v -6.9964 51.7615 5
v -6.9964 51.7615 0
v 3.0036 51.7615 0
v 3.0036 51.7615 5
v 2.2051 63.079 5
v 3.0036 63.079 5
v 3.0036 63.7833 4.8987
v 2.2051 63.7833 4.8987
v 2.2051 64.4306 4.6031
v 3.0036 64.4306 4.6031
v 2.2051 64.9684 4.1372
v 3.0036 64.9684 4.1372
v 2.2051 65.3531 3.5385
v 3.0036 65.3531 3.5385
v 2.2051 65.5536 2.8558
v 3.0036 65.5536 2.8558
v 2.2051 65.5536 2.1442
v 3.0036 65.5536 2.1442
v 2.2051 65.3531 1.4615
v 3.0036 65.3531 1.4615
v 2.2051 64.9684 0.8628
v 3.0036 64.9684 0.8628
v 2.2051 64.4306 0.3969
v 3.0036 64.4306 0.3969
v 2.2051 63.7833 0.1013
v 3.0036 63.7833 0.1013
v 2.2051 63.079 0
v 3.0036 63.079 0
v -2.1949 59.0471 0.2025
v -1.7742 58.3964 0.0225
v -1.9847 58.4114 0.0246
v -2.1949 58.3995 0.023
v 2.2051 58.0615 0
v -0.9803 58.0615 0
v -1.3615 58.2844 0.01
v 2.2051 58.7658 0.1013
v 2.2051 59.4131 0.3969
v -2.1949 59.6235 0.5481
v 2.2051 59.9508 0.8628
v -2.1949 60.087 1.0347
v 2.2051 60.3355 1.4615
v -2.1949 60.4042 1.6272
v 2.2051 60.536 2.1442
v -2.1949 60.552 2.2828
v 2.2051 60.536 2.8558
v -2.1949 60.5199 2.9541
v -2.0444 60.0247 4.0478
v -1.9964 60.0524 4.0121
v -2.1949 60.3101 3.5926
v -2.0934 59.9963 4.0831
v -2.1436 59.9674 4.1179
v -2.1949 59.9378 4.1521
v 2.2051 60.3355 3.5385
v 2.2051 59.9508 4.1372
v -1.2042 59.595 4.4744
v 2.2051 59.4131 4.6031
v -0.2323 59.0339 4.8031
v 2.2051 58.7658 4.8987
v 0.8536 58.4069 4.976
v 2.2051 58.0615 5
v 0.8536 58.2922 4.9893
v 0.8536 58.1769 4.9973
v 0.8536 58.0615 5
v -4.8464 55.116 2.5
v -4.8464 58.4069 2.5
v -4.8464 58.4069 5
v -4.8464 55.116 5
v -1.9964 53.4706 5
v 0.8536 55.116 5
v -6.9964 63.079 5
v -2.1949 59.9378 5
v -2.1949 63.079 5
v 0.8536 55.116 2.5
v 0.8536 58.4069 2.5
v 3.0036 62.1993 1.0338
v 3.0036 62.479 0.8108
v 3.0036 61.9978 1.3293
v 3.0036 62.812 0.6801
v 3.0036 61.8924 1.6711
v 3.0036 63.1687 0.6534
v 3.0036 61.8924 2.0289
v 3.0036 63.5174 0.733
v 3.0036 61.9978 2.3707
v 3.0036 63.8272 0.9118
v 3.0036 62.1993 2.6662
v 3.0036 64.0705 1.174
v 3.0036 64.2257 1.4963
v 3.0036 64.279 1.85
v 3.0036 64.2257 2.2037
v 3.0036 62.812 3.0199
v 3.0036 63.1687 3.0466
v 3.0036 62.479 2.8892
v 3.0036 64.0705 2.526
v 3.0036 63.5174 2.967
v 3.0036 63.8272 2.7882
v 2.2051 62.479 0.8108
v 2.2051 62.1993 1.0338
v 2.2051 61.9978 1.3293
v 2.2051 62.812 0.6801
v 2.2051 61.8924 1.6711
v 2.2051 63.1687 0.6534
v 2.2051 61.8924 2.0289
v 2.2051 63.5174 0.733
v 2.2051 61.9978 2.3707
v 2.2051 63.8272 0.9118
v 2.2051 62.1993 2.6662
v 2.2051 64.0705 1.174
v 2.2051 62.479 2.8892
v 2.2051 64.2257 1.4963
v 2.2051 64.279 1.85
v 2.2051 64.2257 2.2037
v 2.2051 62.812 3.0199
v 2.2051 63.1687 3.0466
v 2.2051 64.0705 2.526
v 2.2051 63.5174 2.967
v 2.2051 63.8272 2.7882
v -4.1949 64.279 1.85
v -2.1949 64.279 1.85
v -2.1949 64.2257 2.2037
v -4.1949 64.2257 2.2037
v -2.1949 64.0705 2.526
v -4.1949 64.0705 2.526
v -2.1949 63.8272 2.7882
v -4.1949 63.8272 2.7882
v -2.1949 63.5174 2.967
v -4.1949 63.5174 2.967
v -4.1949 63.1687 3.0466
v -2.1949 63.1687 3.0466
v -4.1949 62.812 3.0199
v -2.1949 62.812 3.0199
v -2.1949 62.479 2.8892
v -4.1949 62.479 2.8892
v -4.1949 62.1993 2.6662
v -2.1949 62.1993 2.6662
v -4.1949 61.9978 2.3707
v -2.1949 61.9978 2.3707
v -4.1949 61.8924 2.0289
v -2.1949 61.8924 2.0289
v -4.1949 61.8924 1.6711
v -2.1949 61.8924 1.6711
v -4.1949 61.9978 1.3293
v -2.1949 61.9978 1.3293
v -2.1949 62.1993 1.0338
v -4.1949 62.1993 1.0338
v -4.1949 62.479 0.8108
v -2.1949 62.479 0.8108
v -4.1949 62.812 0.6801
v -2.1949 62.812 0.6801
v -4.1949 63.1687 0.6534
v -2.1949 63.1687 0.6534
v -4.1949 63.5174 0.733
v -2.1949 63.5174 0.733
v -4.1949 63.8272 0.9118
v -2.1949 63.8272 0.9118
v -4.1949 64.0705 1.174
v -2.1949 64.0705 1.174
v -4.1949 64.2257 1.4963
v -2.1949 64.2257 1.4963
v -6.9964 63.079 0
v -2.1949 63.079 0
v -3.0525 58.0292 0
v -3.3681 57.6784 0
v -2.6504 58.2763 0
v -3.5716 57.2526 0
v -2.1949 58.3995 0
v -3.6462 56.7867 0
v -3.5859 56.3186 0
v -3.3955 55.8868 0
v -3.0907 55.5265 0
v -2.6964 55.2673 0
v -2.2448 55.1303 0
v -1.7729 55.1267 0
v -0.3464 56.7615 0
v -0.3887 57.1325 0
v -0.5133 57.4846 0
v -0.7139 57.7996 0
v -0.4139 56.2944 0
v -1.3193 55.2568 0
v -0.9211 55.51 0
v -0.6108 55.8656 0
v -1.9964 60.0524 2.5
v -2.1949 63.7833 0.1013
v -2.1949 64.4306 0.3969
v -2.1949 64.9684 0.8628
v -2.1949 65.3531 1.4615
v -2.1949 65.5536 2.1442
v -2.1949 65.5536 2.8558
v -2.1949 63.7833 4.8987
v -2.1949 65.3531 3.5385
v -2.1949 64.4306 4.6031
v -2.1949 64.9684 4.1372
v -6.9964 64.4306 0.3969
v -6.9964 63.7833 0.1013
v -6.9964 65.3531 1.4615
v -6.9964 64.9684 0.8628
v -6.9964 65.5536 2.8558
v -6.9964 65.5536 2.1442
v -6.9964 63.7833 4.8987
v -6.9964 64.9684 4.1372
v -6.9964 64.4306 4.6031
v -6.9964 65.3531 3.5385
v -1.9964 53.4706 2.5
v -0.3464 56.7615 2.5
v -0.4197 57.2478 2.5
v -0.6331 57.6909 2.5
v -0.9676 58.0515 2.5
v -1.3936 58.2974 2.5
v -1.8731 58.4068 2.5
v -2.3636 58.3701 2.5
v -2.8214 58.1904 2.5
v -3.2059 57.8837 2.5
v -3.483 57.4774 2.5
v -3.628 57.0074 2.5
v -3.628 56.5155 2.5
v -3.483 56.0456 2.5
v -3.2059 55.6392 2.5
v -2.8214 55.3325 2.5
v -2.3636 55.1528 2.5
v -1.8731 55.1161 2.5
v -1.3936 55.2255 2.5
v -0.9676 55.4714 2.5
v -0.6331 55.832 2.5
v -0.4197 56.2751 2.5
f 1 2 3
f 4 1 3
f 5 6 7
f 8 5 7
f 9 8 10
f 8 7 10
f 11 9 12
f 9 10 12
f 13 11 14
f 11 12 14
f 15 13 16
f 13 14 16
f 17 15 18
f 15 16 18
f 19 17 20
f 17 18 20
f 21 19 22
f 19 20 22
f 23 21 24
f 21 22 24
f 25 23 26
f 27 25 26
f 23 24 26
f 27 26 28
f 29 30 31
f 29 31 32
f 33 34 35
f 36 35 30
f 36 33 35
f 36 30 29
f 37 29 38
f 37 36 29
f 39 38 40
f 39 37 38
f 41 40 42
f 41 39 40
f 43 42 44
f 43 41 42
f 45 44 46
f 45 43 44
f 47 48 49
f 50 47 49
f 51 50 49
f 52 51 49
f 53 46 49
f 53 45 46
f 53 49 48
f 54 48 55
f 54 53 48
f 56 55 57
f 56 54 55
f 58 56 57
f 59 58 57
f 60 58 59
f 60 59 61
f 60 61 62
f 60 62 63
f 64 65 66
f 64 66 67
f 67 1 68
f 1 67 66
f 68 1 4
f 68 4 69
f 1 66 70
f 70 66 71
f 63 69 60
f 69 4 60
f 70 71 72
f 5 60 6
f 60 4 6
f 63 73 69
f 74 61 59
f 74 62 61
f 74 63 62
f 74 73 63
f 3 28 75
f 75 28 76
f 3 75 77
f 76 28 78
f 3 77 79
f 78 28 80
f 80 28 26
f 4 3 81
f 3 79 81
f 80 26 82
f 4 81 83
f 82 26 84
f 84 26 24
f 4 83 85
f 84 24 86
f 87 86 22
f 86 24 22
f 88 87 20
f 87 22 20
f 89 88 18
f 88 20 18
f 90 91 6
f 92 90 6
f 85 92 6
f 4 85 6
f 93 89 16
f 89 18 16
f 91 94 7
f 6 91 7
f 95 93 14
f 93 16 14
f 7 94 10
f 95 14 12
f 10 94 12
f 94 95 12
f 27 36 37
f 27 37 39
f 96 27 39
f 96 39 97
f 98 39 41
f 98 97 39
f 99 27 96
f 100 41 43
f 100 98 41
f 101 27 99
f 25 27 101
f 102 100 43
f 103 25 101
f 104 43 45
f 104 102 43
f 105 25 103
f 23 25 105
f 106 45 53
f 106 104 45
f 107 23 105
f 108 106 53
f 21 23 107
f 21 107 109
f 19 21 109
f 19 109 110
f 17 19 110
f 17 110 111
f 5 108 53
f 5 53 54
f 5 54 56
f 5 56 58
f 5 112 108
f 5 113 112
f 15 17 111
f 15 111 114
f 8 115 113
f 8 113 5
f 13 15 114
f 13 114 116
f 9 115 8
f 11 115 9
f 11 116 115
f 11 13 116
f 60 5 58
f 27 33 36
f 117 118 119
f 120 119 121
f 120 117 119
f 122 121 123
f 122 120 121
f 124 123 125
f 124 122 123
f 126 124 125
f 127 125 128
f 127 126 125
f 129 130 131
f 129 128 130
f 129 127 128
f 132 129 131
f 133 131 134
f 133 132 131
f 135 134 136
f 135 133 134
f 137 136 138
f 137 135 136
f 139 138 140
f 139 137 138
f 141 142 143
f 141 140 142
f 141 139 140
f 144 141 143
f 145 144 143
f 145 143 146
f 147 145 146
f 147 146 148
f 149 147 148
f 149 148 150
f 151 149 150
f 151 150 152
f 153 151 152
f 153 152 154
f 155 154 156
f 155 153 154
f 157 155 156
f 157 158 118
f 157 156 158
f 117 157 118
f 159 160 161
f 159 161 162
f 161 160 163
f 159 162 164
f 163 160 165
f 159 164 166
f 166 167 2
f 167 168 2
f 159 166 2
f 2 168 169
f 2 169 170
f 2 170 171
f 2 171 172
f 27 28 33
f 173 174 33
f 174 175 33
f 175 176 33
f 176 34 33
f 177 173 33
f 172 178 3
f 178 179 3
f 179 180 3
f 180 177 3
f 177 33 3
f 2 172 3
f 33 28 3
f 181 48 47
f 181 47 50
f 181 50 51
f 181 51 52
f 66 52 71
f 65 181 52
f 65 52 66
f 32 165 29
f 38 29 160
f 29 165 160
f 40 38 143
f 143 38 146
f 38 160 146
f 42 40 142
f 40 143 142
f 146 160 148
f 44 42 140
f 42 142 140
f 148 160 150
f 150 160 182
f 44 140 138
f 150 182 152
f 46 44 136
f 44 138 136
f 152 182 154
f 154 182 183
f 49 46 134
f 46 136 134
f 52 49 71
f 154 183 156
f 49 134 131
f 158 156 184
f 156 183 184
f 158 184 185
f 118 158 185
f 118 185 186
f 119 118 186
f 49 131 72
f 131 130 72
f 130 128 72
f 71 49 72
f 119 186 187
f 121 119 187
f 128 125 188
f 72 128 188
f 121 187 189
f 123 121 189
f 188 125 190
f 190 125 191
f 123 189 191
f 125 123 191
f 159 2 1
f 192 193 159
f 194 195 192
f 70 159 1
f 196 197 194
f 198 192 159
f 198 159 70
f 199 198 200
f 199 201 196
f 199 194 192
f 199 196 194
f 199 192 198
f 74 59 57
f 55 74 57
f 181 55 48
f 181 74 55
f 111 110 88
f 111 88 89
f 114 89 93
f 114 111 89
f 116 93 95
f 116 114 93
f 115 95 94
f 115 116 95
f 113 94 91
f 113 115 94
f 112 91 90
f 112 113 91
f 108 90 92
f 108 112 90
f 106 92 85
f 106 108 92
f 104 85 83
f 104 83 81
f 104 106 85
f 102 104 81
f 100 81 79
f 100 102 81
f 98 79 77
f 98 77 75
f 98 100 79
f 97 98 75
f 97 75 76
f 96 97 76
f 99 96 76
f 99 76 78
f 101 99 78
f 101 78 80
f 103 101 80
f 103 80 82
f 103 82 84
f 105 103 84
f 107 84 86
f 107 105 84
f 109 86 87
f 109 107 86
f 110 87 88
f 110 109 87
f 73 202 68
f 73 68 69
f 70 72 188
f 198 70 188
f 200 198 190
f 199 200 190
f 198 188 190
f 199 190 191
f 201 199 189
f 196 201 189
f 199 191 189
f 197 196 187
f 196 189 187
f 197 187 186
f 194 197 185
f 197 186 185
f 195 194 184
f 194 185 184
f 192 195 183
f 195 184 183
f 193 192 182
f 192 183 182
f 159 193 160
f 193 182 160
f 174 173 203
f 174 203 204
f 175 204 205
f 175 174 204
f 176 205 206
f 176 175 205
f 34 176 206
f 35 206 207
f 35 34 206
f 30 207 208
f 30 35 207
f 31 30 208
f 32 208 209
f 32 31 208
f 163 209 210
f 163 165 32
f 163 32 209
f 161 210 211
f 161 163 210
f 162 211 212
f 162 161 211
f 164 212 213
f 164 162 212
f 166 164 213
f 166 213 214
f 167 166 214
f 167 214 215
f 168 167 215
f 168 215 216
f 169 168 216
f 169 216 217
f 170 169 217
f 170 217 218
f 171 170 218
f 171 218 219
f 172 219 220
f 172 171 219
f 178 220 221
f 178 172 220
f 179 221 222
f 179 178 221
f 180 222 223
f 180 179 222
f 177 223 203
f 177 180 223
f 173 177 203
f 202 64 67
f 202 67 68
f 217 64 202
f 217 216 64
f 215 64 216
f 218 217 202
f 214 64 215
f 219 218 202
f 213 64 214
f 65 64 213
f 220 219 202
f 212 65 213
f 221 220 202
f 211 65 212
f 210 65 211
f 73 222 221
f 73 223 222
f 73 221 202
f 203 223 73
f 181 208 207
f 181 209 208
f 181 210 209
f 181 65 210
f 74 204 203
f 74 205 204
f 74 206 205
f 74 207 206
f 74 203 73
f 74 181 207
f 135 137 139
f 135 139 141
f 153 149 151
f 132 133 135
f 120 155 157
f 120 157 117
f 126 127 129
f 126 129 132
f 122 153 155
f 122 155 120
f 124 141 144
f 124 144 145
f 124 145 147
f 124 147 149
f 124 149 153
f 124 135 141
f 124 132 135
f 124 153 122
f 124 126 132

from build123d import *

# Parameters (mm, degrees)
SKETCH_1_R          = 1.65
EXTRUDE_1_DEPTH     = 2.5
SKETCH_1_3_W        = 10
SKETCH_1_3_H        = 10
EXTRUDE_2_DEPTH     = 5
EXTRUDE_3_DEPTH     = 10
OTHER_START         = -2.194885141
OTHER_1_DEPTH       = 4.4
OTHER_START_2       = -4.194885141
OTHER_1_2_OUTLINE_R = 1.2
OTHER_1_2_DEPTH     = 7.198493548
CUT_EXTRUDE_START   = -9.201507
CUT_EXTRUDE_1_DEPTH = 4.400001


# Read off the part's stored shape, not the designer's step: Отступ1
with BuildPart() as part:
    # Эскиз1 → Бобышка-Вытянуть1 (new body)
    with BuildSketch(Plane.XY):
        Polygon((-4.846391593, 58.406906995), (-4.846391593, 55.11601046), (-1.996391593, 53.470562193), (0.853608407, 55.11601046), (0.853608407, 58.406906995), (-1.996391593, 60.052355262), align=None)
        with Locations((-1.996391593, 56.761458727)):
            Circle(SKETCH_1_R, mode=Mode.SUBTRACT)
    extrude(amount=EXTRUDE_1_DEPTH)

    # Эскиз1<3> → Бобышка-Вытянуть2 (add)
    with BuildSketch(Plane.XY):
        with Locations((-1.996391593, 56.761458727)):
            Rectangle(SKETCH_1_3_W, SKETCH_1_3_H)
        Polygon((-4.846391593, 55.11601046), (-1.996391593, 53.470562193), (0.853608407, 55.11601046), (0.853608407, 58.406906995), (-1.996391593, 60.052355262), (-4.846391593, 58.406906995), align=None, mode=Mode.SUBTRACT)
    extrude(amount=EXTRUDE_2_DEPTH)

    # Эскиз2 → Бобышка-Вытянуть3 (add)
    with BuildSketch(Plane(origin=(3.003608407, 0, 0), x_dir=(0, 0, -1), z_dir=(1, 0, 0))):
        with BuildLine():
            Line((0, 63.079006264), (0, 61.761458727))
            Line((0, 61.761458727), (-5, 61.761458727))
            Line((-5, 61.761458727), (-5, 63.079006264))
            ThreePointArc((-5, 63.079006264), (-2.5, 65.579006264), (0, 63.079006264))
        make_face()
    extrude(amount=-EXTRUDE_3_DEPTH)

    # Отступ1 outline → Отступ1 (cut)
    with BuildSketch(Plane.YZ.offset(OTHER_START)):
        with BuildLine():
            Line((65.153996838, 3.894422503), (63.084523903, 3.899992575))
            ThreePointArc((63.084523903, 3.899992575), (61.080242494, 2.30545954), (62.195830177, 0))
            Line((62.195830177, 0), (63.079006264, 0))
            ThreePointArc((63.079006264, 0), (65.285367098, 1.324427003), (65.153996838, 3.894422503))
        make_face()
    extrude(amount=OTHER_1_DEPTH, mode=Mode.SUBTRACT)

    # Other 1 2 outline → Other 1 2 (cut)
    with BuildSketch(Plane.YZ.offset(OTHER_START_2)):
        with Locations((63.079006264, 1.85)):
            Circle(OTHER_1_2_OUTLINE_R)
    extrude(amount=OTHER_1_2_DEPTH, mode=Mode.SUBTRACT)

    # Эскиз3 → Вырез-Вытянуть1 (cut)
    with BuildSketch(Plane.ZY.offset(6.996391593).offset(CUT_EXTRUDE_START)):
        with BuildLine():
            ThreePointArc((0, 58.061458727), (2.5, 60.561458727), (5, 58.061458727))
            Line((5, 58.061458727), (5, 63.079006264))
            ThreePointArc((5, 63.079006264), (2.5, 65.579006264), (0, 63.079006264))
            Line((0, 63.079006264), (0, 58.061458727))
        make_face()
    extrude(amount=CUT_EXTRUDE_1_DEPTH, mode=Mode.SUBTRACT)


solid = part.part
